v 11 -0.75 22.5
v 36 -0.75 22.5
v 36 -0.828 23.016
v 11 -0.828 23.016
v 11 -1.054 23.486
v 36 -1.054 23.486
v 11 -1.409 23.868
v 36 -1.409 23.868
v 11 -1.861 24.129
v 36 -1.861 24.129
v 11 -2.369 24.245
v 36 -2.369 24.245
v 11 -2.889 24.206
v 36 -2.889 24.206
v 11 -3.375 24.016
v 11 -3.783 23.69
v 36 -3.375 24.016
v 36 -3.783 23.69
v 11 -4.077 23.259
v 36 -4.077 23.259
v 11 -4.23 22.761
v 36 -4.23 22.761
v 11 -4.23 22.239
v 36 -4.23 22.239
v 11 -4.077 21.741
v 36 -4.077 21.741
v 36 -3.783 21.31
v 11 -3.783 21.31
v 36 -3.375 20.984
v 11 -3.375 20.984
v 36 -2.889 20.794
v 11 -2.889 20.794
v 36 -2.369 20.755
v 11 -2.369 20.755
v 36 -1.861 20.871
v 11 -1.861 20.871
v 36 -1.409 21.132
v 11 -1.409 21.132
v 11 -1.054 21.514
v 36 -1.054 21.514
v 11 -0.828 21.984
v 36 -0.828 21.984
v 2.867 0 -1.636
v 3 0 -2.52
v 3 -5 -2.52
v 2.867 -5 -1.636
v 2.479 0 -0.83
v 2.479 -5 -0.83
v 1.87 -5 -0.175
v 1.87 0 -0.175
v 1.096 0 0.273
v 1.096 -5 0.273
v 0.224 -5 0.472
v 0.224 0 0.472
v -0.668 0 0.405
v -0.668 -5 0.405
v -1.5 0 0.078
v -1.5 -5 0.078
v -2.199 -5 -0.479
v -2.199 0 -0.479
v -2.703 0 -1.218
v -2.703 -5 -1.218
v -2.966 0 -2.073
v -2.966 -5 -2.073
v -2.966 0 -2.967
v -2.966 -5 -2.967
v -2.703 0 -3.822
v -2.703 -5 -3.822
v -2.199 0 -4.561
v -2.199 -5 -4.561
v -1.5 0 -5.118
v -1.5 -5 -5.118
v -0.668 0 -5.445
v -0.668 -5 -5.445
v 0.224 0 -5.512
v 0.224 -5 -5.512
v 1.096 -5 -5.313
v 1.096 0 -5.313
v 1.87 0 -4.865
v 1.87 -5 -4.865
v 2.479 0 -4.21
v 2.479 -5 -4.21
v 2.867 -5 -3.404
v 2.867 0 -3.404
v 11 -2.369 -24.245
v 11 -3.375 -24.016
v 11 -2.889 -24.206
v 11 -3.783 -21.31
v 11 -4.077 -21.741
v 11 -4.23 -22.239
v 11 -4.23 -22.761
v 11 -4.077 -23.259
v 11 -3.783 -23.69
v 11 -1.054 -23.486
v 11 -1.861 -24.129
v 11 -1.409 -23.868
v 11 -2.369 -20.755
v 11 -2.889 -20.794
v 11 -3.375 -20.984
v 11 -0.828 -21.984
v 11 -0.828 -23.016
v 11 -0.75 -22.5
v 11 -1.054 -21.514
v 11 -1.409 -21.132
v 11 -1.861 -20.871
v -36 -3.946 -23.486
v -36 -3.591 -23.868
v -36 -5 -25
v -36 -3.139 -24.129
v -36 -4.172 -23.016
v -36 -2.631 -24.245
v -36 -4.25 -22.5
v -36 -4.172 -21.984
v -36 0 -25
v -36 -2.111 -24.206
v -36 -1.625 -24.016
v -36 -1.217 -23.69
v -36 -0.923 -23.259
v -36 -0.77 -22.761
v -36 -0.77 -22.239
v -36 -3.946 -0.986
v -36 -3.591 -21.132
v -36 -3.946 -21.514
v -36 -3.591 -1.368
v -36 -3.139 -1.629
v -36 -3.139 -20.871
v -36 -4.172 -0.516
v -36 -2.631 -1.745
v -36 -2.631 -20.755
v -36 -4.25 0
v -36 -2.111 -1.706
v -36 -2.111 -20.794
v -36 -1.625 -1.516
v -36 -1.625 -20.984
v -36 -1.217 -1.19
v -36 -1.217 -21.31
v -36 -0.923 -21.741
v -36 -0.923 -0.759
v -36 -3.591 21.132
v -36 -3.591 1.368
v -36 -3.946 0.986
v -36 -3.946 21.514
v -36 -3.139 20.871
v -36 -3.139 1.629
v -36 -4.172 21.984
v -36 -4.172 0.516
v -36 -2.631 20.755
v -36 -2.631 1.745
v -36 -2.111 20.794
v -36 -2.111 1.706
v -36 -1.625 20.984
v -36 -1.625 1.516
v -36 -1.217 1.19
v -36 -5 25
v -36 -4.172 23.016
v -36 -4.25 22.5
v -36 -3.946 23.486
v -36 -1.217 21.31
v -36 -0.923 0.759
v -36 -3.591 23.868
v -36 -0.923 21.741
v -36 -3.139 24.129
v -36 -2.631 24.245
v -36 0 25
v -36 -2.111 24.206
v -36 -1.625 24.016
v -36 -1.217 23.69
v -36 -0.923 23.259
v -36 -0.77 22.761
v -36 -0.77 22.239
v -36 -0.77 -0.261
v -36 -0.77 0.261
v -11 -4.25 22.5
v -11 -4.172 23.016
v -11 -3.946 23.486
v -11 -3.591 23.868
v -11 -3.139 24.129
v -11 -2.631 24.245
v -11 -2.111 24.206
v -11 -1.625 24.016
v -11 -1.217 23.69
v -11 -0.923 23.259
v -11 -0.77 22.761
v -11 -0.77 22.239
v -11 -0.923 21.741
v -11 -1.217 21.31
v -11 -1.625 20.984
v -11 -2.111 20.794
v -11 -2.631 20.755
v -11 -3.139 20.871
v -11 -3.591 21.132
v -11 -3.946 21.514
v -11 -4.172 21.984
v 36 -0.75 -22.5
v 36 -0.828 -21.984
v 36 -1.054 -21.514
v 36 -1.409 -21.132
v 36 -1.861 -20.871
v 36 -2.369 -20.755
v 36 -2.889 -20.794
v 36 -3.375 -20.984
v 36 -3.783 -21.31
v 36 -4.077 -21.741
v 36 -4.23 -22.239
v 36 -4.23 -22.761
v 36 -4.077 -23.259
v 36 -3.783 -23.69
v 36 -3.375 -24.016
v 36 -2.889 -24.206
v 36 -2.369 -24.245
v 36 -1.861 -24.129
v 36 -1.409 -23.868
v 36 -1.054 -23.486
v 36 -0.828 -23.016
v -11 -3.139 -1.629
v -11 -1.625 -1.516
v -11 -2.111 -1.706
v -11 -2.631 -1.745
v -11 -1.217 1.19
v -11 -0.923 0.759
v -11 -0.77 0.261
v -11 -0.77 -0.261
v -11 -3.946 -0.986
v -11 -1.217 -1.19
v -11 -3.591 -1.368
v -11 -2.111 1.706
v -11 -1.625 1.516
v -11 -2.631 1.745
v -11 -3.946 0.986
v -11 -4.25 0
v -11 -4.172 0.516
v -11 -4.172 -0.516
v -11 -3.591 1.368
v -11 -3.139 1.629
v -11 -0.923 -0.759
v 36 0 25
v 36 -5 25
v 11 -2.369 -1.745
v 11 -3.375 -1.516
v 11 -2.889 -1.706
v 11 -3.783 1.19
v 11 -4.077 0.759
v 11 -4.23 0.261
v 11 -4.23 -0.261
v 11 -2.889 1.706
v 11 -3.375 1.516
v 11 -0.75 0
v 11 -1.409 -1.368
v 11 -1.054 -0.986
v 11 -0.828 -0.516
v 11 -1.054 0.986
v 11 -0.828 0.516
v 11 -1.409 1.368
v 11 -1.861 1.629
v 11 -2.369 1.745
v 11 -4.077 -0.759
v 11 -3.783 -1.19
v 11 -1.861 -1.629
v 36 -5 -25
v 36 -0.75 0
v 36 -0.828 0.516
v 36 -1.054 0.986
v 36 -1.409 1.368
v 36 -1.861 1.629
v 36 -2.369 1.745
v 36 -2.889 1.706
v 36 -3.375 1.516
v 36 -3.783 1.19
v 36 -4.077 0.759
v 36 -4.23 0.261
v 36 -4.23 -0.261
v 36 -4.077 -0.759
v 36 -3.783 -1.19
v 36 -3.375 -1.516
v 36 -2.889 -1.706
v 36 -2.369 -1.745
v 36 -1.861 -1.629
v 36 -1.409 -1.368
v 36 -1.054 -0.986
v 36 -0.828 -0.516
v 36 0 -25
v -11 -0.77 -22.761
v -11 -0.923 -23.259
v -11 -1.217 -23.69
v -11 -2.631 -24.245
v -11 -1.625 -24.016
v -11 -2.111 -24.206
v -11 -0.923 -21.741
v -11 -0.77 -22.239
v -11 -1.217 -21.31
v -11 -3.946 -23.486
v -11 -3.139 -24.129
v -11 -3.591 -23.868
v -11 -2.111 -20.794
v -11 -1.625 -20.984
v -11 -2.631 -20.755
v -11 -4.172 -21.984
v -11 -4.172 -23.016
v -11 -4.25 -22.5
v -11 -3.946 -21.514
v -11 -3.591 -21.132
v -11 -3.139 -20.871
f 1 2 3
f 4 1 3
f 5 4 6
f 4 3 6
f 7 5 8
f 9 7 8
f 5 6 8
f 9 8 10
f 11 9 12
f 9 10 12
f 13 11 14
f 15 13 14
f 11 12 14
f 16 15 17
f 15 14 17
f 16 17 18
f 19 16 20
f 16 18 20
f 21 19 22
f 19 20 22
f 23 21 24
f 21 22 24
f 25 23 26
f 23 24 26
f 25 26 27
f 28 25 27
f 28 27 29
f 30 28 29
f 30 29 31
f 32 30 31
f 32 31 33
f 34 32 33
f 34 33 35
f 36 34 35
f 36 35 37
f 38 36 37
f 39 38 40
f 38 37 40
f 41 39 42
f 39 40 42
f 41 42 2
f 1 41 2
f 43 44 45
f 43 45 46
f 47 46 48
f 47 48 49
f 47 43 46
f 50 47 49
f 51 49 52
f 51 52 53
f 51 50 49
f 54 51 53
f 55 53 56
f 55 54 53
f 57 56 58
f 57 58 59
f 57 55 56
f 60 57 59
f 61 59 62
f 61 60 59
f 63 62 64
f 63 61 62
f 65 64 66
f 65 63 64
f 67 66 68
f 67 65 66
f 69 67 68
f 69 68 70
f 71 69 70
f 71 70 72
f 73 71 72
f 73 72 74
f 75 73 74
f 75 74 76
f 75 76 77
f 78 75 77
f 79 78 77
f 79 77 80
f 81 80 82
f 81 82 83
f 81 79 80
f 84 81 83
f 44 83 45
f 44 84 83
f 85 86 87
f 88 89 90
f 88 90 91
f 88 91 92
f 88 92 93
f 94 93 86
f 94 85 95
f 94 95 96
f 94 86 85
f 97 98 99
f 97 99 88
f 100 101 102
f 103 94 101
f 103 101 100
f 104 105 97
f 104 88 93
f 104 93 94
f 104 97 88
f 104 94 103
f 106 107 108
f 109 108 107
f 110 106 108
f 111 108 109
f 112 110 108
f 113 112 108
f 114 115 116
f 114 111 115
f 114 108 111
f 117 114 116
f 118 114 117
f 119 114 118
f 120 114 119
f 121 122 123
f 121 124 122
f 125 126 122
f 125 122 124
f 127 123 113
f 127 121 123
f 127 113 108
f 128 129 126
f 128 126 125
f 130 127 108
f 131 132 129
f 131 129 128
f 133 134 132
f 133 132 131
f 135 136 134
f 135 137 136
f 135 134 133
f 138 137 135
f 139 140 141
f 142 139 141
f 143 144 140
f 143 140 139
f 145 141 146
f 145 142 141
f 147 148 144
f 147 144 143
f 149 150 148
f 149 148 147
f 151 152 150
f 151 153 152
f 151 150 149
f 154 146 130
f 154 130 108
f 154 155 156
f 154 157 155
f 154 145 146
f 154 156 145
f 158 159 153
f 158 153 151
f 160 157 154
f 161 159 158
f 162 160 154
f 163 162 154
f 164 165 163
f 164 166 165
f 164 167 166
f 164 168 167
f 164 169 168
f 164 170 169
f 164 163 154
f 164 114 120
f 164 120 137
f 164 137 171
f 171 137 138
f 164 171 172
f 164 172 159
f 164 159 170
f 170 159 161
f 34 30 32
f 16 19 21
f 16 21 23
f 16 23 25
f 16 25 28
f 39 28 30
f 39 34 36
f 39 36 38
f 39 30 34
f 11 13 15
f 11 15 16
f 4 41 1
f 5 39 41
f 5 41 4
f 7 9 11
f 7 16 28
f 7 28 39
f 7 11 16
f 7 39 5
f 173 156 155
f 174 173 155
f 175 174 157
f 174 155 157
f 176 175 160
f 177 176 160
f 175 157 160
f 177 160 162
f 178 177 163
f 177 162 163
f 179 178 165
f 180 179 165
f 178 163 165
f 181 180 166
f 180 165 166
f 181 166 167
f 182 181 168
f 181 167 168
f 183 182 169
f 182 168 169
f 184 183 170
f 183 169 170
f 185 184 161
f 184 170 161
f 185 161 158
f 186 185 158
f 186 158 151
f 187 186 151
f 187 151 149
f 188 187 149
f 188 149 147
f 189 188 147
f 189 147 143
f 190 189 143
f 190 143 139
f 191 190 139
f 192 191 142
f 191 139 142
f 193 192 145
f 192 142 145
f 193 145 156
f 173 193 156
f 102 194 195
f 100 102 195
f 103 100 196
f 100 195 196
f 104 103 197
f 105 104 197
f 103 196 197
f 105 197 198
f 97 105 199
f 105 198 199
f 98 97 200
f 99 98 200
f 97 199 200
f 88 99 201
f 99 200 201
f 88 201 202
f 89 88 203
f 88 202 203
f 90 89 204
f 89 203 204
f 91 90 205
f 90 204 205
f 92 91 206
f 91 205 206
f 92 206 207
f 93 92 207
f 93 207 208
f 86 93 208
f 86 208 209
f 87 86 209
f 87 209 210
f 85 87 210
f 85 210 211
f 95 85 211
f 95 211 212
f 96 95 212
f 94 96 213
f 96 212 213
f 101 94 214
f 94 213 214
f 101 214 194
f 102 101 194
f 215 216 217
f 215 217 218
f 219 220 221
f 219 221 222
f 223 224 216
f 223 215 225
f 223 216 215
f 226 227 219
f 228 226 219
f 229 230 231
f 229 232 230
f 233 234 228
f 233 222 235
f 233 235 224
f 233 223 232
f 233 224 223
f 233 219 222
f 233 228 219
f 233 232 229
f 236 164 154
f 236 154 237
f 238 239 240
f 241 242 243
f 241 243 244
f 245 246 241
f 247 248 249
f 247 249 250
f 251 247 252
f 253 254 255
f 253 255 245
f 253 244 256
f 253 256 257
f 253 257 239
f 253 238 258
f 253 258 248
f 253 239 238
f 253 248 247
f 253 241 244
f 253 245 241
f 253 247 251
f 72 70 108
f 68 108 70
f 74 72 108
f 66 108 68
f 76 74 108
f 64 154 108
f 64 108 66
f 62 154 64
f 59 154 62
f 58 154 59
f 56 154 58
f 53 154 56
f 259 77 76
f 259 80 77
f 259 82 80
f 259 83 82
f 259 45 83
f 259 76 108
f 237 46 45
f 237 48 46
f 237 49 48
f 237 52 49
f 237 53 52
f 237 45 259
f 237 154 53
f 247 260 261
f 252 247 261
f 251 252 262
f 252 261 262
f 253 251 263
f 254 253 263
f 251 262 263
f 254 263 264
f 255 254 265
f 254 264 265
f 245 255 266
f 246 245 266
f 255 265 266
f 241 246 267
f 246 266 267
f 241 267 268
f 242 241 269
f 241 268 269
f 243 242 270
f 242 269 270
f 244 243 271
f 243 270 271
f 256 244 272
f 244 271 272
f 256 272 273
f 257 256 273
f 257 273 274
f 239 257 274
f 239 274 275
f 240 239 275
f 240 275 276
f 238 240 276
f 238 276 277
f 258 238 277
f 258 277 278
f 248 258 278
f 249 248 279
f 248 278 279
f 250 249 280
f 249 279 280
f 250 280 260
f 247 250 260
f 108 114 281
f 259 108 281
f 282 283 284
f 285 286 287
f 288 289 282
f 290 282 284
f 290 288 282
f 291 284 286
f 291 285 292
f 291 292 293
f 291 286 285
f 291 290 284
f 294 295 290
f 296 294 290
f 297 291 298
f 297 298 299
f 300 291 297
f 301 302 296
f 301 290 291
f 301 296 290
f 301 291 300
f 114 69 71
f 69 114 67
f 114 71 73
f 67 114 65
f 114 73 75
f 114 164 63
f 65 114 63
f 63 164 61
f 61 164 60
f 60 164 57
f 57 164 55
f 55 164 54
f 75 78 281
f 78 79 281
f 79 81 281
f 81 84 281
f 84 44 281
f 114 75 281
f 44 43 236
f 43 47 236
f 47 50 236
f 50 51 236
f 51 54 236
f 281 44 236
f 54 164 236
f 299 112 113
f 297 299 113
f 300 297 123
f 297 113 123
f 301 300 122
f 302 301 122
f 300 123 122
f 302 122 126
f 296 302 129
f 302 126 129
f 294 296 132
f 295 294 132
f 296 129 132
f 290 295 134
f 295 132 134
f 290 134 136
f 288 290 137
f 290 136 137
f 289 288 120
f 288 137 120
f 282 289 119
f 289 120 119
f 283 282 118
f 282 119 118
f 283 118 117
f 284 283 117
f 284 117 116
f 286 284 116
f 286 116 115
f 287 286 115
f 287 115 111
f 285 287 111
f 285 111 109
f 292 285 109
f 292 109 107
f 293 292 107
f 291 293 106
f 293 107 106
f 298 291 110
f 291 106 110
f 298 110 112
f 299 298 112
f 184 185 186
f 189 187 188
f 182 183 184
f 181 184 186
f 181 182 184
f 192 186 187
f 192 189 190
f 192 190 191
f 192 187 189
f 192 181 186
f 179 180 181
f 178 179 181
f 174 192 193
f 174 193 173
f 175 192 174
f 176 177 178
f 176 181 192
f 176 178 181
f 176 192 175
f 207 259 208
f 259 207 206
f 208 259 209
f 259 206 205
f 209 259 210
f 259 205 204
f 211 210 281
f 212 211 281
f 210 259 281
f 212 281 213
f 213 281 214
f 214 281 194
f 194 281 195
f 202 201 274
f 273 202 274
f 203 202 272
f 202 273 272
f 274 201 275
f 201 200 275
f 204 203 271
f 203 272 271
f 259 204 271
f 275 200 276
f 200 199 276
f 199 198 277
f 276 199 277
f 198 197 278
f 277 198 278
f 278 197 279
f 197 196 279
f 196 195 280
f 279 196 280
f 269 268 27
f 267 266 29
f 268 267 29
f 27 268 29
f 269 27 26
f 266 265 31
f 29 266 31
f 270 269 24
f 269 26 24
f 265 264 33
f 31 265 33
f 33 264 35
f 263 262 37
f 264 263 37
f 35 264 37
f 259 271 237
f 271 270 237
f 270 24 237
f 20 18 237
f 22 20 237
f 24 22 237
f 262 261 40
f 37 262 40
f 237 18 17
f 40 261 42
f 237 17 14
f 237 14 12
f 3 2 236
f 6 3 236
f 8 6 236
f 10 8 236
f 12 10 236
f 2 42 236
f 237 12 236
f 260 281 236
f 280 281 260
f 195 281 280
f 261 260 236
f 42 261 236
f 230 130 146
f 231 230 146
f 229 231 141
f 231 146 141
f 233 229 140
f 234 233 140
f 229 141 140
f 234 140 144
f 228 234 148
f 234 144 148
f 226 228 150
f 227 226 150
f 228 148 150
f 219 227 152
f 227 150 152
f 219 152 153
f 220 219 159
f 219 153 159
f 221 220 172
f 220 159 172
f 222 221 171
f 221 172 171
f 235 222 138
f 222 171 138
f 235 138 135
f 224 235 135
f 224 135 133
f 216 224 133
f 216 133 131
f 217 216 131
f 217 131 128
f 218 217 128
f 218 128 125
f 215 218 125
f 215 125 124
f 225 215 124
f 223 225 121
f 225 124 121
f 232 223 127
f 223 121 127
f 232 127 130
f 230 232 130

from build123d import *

# Parameters (mm, degrees)
F0_W     = 72
F0_H     = 50
F0_R     = 3
F1_DEPTH = 5
F2_R     = 1.75
F3_DEPTH = 25
F4_R     = 1.75
F5_DEPTH = 25


with BuildPart() as f1:
    # F0 (on Front) → F1 (new body)
    with BuildSketch(Plane.XZ):
        Rectangle(F0_W, F0_H)
        with Locations((0, -2.52)):
            Circle(F0_R, mode=Mode.SUBTRACT)
    extrude(amount=F1_DEPTH)

    # F2 (on face) → F3 (cut)
    with BuildSketch(Plane(origin=(-36, 0, 0), x_dir=(0, -1, 0), z_dir=(-1, 0, 0))):
        with Locations((2.5, 22.5)):
            Circle(F2_R)
        with Locations((2.5, -22.5)):
            Circle(F2_R)
        with Locations((2.5, 0)):
            Circle(F2_R)
    extrude(amount=-F3_DEPTH, mode=Mode.SUBTRACT)

    # F4 (on face) → F5 (cut)
    with BuildSketch(Plane.YZ.offset(36)):
        with Locations((-2.5, 0)):
            Circle(F4_R)
        with Locations((-2.5, 22.5)):
            Circle(F4_R)
        with Locations((-2.5, -22.5)):
            Circle(F4_R)
    extrude(amount=-F5_DEPTH, mode=Mode.SUBTRACT)


solid = f1.part
